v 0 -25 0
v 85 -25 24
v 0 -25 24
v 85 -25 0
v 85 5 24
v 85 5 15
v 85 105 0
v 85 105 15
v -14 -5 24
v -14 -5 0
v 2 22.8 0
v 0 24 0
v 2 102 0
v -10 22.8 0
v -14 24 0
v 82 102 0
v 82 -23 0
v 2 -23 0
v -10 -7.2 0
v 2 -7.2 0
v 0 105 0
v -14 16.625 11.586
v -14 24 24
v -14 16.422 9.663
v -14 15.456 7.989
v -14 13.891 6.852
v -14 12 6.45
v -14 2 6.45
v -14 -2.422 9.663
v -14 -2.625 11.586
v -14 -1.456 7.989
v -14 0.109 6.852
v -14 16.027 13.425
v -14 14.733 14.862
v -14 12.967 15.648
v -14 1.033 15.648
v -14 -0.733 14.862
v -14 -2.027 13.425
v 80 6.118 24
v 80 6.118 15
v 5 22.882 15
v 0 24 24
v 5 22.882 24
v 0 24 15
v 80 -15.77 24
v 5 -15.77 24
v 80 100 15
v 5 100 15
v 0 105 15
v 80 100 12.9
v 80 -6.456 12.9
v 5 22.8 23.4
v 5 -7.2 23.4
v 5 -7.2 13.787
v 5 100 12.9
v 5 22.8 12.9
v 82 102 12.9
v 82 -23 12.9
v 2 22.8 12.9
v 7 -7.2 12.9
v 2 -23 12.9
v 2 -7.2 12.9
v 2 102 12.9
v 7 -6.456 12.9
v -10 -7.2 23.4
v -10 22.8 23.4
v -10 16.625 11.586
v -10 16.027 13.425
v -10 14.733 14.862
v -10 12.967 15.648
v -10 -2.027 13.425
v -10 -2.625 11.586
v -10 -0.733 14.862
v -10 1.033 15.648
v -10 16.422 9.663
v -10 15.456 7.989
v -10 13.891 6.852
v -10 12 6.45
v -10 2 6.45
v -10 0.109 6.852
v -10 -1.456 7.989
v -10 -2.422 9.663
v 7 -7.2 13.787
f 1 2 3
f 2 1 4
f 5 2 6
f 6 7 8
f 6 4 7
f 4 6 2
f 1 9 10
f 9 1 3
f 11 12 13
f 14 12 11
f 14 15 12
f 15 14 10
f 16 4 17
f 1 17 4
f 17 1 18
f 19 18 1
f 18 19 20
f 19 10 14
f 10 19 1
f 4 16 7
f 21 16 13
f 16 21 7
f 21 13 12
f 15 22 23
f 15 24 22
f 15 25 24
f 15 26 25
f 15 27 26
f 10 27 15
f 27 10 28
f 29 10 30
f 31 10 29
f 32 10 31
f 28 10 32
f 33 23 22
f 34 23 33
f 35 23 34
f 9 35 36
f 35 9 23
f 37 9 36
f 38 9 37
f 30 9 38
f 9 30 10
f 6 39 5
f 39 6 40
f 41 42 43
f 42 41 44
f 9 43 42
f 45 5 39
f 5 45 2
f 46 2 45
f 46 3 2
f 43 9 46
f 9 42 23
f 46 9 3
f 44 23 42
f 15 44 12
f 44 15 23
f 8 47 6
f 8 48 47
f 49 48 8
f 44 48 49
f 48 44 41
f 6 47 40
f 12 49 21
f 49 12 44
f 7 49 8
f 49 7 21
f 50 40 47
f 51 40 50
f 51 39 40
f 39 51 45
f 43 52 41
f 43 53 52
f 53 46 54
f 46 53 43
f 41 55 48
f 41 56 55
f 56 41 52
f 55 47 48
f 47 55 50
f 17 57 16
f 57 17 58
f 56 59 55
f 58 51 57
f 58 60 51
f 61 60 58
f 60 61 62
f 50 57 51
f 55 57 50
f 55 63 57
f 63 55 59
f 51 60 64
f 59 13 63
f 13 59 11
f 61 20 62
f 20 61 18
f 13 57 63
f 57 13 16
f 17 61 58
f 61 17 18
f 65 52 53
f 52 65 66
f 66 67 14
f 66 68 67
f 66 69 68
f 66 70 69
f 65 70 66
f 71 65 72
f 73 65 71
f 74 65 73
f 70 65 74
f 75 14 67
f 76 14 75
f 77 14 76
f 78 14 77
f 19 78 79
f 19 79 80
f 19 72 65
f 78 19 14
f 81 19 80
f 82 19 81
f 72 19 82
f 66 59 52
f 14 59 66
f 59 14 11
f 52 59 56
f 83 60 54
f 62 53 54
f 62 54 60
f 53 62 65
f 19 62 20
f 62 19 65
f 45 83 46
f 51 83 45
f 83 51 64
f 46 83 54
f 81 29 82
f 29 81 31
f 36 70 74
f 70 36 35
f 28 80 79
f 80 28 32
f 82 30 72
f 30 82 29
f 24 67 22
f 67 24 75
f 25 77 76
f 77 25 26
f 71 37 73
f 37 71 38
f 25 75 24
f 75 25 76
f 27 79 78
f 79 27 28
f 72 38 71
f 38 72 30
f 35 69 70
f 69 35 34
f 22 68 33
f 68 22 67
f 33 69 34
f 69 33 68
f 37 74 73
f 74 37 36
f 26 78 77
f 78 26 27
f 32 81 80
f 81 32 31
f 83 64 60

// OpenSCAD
module case() {
    difference() {
        union() {
	    hull(){
	        translate([-14,-5,0]) cube([14,29,24]);
	        translate([0,-25,0]) cube([85, 30, 24]);
	    }
            cube([85, 105, 15]);
	}
        translate([5,5,4]) cube([75, 95, 100]); //This is the open part 
	translate([2,-23,-0.1]) #cube([80, 125, 13]);
	translate([-10,-7.2,-0.1]) cube([12, 30, 23.5]);
	translate([5,-25,35]) rotate([-50, 0, 0]) cube([75,100,50]);
	translate([-29,2, 11.1]) #hull(){
	    translate([0,0,0]) rotate([0,90,0]) cylinder(h=50, d=9.3);
	    translate([0,10,0]) rotate([0,90,0]) cylinder(h=50, d=9.3);
	}
	translate([-5,-7.2,-0.1]) #cube([12, 30, 23.5]);
    }
    
}

case();
